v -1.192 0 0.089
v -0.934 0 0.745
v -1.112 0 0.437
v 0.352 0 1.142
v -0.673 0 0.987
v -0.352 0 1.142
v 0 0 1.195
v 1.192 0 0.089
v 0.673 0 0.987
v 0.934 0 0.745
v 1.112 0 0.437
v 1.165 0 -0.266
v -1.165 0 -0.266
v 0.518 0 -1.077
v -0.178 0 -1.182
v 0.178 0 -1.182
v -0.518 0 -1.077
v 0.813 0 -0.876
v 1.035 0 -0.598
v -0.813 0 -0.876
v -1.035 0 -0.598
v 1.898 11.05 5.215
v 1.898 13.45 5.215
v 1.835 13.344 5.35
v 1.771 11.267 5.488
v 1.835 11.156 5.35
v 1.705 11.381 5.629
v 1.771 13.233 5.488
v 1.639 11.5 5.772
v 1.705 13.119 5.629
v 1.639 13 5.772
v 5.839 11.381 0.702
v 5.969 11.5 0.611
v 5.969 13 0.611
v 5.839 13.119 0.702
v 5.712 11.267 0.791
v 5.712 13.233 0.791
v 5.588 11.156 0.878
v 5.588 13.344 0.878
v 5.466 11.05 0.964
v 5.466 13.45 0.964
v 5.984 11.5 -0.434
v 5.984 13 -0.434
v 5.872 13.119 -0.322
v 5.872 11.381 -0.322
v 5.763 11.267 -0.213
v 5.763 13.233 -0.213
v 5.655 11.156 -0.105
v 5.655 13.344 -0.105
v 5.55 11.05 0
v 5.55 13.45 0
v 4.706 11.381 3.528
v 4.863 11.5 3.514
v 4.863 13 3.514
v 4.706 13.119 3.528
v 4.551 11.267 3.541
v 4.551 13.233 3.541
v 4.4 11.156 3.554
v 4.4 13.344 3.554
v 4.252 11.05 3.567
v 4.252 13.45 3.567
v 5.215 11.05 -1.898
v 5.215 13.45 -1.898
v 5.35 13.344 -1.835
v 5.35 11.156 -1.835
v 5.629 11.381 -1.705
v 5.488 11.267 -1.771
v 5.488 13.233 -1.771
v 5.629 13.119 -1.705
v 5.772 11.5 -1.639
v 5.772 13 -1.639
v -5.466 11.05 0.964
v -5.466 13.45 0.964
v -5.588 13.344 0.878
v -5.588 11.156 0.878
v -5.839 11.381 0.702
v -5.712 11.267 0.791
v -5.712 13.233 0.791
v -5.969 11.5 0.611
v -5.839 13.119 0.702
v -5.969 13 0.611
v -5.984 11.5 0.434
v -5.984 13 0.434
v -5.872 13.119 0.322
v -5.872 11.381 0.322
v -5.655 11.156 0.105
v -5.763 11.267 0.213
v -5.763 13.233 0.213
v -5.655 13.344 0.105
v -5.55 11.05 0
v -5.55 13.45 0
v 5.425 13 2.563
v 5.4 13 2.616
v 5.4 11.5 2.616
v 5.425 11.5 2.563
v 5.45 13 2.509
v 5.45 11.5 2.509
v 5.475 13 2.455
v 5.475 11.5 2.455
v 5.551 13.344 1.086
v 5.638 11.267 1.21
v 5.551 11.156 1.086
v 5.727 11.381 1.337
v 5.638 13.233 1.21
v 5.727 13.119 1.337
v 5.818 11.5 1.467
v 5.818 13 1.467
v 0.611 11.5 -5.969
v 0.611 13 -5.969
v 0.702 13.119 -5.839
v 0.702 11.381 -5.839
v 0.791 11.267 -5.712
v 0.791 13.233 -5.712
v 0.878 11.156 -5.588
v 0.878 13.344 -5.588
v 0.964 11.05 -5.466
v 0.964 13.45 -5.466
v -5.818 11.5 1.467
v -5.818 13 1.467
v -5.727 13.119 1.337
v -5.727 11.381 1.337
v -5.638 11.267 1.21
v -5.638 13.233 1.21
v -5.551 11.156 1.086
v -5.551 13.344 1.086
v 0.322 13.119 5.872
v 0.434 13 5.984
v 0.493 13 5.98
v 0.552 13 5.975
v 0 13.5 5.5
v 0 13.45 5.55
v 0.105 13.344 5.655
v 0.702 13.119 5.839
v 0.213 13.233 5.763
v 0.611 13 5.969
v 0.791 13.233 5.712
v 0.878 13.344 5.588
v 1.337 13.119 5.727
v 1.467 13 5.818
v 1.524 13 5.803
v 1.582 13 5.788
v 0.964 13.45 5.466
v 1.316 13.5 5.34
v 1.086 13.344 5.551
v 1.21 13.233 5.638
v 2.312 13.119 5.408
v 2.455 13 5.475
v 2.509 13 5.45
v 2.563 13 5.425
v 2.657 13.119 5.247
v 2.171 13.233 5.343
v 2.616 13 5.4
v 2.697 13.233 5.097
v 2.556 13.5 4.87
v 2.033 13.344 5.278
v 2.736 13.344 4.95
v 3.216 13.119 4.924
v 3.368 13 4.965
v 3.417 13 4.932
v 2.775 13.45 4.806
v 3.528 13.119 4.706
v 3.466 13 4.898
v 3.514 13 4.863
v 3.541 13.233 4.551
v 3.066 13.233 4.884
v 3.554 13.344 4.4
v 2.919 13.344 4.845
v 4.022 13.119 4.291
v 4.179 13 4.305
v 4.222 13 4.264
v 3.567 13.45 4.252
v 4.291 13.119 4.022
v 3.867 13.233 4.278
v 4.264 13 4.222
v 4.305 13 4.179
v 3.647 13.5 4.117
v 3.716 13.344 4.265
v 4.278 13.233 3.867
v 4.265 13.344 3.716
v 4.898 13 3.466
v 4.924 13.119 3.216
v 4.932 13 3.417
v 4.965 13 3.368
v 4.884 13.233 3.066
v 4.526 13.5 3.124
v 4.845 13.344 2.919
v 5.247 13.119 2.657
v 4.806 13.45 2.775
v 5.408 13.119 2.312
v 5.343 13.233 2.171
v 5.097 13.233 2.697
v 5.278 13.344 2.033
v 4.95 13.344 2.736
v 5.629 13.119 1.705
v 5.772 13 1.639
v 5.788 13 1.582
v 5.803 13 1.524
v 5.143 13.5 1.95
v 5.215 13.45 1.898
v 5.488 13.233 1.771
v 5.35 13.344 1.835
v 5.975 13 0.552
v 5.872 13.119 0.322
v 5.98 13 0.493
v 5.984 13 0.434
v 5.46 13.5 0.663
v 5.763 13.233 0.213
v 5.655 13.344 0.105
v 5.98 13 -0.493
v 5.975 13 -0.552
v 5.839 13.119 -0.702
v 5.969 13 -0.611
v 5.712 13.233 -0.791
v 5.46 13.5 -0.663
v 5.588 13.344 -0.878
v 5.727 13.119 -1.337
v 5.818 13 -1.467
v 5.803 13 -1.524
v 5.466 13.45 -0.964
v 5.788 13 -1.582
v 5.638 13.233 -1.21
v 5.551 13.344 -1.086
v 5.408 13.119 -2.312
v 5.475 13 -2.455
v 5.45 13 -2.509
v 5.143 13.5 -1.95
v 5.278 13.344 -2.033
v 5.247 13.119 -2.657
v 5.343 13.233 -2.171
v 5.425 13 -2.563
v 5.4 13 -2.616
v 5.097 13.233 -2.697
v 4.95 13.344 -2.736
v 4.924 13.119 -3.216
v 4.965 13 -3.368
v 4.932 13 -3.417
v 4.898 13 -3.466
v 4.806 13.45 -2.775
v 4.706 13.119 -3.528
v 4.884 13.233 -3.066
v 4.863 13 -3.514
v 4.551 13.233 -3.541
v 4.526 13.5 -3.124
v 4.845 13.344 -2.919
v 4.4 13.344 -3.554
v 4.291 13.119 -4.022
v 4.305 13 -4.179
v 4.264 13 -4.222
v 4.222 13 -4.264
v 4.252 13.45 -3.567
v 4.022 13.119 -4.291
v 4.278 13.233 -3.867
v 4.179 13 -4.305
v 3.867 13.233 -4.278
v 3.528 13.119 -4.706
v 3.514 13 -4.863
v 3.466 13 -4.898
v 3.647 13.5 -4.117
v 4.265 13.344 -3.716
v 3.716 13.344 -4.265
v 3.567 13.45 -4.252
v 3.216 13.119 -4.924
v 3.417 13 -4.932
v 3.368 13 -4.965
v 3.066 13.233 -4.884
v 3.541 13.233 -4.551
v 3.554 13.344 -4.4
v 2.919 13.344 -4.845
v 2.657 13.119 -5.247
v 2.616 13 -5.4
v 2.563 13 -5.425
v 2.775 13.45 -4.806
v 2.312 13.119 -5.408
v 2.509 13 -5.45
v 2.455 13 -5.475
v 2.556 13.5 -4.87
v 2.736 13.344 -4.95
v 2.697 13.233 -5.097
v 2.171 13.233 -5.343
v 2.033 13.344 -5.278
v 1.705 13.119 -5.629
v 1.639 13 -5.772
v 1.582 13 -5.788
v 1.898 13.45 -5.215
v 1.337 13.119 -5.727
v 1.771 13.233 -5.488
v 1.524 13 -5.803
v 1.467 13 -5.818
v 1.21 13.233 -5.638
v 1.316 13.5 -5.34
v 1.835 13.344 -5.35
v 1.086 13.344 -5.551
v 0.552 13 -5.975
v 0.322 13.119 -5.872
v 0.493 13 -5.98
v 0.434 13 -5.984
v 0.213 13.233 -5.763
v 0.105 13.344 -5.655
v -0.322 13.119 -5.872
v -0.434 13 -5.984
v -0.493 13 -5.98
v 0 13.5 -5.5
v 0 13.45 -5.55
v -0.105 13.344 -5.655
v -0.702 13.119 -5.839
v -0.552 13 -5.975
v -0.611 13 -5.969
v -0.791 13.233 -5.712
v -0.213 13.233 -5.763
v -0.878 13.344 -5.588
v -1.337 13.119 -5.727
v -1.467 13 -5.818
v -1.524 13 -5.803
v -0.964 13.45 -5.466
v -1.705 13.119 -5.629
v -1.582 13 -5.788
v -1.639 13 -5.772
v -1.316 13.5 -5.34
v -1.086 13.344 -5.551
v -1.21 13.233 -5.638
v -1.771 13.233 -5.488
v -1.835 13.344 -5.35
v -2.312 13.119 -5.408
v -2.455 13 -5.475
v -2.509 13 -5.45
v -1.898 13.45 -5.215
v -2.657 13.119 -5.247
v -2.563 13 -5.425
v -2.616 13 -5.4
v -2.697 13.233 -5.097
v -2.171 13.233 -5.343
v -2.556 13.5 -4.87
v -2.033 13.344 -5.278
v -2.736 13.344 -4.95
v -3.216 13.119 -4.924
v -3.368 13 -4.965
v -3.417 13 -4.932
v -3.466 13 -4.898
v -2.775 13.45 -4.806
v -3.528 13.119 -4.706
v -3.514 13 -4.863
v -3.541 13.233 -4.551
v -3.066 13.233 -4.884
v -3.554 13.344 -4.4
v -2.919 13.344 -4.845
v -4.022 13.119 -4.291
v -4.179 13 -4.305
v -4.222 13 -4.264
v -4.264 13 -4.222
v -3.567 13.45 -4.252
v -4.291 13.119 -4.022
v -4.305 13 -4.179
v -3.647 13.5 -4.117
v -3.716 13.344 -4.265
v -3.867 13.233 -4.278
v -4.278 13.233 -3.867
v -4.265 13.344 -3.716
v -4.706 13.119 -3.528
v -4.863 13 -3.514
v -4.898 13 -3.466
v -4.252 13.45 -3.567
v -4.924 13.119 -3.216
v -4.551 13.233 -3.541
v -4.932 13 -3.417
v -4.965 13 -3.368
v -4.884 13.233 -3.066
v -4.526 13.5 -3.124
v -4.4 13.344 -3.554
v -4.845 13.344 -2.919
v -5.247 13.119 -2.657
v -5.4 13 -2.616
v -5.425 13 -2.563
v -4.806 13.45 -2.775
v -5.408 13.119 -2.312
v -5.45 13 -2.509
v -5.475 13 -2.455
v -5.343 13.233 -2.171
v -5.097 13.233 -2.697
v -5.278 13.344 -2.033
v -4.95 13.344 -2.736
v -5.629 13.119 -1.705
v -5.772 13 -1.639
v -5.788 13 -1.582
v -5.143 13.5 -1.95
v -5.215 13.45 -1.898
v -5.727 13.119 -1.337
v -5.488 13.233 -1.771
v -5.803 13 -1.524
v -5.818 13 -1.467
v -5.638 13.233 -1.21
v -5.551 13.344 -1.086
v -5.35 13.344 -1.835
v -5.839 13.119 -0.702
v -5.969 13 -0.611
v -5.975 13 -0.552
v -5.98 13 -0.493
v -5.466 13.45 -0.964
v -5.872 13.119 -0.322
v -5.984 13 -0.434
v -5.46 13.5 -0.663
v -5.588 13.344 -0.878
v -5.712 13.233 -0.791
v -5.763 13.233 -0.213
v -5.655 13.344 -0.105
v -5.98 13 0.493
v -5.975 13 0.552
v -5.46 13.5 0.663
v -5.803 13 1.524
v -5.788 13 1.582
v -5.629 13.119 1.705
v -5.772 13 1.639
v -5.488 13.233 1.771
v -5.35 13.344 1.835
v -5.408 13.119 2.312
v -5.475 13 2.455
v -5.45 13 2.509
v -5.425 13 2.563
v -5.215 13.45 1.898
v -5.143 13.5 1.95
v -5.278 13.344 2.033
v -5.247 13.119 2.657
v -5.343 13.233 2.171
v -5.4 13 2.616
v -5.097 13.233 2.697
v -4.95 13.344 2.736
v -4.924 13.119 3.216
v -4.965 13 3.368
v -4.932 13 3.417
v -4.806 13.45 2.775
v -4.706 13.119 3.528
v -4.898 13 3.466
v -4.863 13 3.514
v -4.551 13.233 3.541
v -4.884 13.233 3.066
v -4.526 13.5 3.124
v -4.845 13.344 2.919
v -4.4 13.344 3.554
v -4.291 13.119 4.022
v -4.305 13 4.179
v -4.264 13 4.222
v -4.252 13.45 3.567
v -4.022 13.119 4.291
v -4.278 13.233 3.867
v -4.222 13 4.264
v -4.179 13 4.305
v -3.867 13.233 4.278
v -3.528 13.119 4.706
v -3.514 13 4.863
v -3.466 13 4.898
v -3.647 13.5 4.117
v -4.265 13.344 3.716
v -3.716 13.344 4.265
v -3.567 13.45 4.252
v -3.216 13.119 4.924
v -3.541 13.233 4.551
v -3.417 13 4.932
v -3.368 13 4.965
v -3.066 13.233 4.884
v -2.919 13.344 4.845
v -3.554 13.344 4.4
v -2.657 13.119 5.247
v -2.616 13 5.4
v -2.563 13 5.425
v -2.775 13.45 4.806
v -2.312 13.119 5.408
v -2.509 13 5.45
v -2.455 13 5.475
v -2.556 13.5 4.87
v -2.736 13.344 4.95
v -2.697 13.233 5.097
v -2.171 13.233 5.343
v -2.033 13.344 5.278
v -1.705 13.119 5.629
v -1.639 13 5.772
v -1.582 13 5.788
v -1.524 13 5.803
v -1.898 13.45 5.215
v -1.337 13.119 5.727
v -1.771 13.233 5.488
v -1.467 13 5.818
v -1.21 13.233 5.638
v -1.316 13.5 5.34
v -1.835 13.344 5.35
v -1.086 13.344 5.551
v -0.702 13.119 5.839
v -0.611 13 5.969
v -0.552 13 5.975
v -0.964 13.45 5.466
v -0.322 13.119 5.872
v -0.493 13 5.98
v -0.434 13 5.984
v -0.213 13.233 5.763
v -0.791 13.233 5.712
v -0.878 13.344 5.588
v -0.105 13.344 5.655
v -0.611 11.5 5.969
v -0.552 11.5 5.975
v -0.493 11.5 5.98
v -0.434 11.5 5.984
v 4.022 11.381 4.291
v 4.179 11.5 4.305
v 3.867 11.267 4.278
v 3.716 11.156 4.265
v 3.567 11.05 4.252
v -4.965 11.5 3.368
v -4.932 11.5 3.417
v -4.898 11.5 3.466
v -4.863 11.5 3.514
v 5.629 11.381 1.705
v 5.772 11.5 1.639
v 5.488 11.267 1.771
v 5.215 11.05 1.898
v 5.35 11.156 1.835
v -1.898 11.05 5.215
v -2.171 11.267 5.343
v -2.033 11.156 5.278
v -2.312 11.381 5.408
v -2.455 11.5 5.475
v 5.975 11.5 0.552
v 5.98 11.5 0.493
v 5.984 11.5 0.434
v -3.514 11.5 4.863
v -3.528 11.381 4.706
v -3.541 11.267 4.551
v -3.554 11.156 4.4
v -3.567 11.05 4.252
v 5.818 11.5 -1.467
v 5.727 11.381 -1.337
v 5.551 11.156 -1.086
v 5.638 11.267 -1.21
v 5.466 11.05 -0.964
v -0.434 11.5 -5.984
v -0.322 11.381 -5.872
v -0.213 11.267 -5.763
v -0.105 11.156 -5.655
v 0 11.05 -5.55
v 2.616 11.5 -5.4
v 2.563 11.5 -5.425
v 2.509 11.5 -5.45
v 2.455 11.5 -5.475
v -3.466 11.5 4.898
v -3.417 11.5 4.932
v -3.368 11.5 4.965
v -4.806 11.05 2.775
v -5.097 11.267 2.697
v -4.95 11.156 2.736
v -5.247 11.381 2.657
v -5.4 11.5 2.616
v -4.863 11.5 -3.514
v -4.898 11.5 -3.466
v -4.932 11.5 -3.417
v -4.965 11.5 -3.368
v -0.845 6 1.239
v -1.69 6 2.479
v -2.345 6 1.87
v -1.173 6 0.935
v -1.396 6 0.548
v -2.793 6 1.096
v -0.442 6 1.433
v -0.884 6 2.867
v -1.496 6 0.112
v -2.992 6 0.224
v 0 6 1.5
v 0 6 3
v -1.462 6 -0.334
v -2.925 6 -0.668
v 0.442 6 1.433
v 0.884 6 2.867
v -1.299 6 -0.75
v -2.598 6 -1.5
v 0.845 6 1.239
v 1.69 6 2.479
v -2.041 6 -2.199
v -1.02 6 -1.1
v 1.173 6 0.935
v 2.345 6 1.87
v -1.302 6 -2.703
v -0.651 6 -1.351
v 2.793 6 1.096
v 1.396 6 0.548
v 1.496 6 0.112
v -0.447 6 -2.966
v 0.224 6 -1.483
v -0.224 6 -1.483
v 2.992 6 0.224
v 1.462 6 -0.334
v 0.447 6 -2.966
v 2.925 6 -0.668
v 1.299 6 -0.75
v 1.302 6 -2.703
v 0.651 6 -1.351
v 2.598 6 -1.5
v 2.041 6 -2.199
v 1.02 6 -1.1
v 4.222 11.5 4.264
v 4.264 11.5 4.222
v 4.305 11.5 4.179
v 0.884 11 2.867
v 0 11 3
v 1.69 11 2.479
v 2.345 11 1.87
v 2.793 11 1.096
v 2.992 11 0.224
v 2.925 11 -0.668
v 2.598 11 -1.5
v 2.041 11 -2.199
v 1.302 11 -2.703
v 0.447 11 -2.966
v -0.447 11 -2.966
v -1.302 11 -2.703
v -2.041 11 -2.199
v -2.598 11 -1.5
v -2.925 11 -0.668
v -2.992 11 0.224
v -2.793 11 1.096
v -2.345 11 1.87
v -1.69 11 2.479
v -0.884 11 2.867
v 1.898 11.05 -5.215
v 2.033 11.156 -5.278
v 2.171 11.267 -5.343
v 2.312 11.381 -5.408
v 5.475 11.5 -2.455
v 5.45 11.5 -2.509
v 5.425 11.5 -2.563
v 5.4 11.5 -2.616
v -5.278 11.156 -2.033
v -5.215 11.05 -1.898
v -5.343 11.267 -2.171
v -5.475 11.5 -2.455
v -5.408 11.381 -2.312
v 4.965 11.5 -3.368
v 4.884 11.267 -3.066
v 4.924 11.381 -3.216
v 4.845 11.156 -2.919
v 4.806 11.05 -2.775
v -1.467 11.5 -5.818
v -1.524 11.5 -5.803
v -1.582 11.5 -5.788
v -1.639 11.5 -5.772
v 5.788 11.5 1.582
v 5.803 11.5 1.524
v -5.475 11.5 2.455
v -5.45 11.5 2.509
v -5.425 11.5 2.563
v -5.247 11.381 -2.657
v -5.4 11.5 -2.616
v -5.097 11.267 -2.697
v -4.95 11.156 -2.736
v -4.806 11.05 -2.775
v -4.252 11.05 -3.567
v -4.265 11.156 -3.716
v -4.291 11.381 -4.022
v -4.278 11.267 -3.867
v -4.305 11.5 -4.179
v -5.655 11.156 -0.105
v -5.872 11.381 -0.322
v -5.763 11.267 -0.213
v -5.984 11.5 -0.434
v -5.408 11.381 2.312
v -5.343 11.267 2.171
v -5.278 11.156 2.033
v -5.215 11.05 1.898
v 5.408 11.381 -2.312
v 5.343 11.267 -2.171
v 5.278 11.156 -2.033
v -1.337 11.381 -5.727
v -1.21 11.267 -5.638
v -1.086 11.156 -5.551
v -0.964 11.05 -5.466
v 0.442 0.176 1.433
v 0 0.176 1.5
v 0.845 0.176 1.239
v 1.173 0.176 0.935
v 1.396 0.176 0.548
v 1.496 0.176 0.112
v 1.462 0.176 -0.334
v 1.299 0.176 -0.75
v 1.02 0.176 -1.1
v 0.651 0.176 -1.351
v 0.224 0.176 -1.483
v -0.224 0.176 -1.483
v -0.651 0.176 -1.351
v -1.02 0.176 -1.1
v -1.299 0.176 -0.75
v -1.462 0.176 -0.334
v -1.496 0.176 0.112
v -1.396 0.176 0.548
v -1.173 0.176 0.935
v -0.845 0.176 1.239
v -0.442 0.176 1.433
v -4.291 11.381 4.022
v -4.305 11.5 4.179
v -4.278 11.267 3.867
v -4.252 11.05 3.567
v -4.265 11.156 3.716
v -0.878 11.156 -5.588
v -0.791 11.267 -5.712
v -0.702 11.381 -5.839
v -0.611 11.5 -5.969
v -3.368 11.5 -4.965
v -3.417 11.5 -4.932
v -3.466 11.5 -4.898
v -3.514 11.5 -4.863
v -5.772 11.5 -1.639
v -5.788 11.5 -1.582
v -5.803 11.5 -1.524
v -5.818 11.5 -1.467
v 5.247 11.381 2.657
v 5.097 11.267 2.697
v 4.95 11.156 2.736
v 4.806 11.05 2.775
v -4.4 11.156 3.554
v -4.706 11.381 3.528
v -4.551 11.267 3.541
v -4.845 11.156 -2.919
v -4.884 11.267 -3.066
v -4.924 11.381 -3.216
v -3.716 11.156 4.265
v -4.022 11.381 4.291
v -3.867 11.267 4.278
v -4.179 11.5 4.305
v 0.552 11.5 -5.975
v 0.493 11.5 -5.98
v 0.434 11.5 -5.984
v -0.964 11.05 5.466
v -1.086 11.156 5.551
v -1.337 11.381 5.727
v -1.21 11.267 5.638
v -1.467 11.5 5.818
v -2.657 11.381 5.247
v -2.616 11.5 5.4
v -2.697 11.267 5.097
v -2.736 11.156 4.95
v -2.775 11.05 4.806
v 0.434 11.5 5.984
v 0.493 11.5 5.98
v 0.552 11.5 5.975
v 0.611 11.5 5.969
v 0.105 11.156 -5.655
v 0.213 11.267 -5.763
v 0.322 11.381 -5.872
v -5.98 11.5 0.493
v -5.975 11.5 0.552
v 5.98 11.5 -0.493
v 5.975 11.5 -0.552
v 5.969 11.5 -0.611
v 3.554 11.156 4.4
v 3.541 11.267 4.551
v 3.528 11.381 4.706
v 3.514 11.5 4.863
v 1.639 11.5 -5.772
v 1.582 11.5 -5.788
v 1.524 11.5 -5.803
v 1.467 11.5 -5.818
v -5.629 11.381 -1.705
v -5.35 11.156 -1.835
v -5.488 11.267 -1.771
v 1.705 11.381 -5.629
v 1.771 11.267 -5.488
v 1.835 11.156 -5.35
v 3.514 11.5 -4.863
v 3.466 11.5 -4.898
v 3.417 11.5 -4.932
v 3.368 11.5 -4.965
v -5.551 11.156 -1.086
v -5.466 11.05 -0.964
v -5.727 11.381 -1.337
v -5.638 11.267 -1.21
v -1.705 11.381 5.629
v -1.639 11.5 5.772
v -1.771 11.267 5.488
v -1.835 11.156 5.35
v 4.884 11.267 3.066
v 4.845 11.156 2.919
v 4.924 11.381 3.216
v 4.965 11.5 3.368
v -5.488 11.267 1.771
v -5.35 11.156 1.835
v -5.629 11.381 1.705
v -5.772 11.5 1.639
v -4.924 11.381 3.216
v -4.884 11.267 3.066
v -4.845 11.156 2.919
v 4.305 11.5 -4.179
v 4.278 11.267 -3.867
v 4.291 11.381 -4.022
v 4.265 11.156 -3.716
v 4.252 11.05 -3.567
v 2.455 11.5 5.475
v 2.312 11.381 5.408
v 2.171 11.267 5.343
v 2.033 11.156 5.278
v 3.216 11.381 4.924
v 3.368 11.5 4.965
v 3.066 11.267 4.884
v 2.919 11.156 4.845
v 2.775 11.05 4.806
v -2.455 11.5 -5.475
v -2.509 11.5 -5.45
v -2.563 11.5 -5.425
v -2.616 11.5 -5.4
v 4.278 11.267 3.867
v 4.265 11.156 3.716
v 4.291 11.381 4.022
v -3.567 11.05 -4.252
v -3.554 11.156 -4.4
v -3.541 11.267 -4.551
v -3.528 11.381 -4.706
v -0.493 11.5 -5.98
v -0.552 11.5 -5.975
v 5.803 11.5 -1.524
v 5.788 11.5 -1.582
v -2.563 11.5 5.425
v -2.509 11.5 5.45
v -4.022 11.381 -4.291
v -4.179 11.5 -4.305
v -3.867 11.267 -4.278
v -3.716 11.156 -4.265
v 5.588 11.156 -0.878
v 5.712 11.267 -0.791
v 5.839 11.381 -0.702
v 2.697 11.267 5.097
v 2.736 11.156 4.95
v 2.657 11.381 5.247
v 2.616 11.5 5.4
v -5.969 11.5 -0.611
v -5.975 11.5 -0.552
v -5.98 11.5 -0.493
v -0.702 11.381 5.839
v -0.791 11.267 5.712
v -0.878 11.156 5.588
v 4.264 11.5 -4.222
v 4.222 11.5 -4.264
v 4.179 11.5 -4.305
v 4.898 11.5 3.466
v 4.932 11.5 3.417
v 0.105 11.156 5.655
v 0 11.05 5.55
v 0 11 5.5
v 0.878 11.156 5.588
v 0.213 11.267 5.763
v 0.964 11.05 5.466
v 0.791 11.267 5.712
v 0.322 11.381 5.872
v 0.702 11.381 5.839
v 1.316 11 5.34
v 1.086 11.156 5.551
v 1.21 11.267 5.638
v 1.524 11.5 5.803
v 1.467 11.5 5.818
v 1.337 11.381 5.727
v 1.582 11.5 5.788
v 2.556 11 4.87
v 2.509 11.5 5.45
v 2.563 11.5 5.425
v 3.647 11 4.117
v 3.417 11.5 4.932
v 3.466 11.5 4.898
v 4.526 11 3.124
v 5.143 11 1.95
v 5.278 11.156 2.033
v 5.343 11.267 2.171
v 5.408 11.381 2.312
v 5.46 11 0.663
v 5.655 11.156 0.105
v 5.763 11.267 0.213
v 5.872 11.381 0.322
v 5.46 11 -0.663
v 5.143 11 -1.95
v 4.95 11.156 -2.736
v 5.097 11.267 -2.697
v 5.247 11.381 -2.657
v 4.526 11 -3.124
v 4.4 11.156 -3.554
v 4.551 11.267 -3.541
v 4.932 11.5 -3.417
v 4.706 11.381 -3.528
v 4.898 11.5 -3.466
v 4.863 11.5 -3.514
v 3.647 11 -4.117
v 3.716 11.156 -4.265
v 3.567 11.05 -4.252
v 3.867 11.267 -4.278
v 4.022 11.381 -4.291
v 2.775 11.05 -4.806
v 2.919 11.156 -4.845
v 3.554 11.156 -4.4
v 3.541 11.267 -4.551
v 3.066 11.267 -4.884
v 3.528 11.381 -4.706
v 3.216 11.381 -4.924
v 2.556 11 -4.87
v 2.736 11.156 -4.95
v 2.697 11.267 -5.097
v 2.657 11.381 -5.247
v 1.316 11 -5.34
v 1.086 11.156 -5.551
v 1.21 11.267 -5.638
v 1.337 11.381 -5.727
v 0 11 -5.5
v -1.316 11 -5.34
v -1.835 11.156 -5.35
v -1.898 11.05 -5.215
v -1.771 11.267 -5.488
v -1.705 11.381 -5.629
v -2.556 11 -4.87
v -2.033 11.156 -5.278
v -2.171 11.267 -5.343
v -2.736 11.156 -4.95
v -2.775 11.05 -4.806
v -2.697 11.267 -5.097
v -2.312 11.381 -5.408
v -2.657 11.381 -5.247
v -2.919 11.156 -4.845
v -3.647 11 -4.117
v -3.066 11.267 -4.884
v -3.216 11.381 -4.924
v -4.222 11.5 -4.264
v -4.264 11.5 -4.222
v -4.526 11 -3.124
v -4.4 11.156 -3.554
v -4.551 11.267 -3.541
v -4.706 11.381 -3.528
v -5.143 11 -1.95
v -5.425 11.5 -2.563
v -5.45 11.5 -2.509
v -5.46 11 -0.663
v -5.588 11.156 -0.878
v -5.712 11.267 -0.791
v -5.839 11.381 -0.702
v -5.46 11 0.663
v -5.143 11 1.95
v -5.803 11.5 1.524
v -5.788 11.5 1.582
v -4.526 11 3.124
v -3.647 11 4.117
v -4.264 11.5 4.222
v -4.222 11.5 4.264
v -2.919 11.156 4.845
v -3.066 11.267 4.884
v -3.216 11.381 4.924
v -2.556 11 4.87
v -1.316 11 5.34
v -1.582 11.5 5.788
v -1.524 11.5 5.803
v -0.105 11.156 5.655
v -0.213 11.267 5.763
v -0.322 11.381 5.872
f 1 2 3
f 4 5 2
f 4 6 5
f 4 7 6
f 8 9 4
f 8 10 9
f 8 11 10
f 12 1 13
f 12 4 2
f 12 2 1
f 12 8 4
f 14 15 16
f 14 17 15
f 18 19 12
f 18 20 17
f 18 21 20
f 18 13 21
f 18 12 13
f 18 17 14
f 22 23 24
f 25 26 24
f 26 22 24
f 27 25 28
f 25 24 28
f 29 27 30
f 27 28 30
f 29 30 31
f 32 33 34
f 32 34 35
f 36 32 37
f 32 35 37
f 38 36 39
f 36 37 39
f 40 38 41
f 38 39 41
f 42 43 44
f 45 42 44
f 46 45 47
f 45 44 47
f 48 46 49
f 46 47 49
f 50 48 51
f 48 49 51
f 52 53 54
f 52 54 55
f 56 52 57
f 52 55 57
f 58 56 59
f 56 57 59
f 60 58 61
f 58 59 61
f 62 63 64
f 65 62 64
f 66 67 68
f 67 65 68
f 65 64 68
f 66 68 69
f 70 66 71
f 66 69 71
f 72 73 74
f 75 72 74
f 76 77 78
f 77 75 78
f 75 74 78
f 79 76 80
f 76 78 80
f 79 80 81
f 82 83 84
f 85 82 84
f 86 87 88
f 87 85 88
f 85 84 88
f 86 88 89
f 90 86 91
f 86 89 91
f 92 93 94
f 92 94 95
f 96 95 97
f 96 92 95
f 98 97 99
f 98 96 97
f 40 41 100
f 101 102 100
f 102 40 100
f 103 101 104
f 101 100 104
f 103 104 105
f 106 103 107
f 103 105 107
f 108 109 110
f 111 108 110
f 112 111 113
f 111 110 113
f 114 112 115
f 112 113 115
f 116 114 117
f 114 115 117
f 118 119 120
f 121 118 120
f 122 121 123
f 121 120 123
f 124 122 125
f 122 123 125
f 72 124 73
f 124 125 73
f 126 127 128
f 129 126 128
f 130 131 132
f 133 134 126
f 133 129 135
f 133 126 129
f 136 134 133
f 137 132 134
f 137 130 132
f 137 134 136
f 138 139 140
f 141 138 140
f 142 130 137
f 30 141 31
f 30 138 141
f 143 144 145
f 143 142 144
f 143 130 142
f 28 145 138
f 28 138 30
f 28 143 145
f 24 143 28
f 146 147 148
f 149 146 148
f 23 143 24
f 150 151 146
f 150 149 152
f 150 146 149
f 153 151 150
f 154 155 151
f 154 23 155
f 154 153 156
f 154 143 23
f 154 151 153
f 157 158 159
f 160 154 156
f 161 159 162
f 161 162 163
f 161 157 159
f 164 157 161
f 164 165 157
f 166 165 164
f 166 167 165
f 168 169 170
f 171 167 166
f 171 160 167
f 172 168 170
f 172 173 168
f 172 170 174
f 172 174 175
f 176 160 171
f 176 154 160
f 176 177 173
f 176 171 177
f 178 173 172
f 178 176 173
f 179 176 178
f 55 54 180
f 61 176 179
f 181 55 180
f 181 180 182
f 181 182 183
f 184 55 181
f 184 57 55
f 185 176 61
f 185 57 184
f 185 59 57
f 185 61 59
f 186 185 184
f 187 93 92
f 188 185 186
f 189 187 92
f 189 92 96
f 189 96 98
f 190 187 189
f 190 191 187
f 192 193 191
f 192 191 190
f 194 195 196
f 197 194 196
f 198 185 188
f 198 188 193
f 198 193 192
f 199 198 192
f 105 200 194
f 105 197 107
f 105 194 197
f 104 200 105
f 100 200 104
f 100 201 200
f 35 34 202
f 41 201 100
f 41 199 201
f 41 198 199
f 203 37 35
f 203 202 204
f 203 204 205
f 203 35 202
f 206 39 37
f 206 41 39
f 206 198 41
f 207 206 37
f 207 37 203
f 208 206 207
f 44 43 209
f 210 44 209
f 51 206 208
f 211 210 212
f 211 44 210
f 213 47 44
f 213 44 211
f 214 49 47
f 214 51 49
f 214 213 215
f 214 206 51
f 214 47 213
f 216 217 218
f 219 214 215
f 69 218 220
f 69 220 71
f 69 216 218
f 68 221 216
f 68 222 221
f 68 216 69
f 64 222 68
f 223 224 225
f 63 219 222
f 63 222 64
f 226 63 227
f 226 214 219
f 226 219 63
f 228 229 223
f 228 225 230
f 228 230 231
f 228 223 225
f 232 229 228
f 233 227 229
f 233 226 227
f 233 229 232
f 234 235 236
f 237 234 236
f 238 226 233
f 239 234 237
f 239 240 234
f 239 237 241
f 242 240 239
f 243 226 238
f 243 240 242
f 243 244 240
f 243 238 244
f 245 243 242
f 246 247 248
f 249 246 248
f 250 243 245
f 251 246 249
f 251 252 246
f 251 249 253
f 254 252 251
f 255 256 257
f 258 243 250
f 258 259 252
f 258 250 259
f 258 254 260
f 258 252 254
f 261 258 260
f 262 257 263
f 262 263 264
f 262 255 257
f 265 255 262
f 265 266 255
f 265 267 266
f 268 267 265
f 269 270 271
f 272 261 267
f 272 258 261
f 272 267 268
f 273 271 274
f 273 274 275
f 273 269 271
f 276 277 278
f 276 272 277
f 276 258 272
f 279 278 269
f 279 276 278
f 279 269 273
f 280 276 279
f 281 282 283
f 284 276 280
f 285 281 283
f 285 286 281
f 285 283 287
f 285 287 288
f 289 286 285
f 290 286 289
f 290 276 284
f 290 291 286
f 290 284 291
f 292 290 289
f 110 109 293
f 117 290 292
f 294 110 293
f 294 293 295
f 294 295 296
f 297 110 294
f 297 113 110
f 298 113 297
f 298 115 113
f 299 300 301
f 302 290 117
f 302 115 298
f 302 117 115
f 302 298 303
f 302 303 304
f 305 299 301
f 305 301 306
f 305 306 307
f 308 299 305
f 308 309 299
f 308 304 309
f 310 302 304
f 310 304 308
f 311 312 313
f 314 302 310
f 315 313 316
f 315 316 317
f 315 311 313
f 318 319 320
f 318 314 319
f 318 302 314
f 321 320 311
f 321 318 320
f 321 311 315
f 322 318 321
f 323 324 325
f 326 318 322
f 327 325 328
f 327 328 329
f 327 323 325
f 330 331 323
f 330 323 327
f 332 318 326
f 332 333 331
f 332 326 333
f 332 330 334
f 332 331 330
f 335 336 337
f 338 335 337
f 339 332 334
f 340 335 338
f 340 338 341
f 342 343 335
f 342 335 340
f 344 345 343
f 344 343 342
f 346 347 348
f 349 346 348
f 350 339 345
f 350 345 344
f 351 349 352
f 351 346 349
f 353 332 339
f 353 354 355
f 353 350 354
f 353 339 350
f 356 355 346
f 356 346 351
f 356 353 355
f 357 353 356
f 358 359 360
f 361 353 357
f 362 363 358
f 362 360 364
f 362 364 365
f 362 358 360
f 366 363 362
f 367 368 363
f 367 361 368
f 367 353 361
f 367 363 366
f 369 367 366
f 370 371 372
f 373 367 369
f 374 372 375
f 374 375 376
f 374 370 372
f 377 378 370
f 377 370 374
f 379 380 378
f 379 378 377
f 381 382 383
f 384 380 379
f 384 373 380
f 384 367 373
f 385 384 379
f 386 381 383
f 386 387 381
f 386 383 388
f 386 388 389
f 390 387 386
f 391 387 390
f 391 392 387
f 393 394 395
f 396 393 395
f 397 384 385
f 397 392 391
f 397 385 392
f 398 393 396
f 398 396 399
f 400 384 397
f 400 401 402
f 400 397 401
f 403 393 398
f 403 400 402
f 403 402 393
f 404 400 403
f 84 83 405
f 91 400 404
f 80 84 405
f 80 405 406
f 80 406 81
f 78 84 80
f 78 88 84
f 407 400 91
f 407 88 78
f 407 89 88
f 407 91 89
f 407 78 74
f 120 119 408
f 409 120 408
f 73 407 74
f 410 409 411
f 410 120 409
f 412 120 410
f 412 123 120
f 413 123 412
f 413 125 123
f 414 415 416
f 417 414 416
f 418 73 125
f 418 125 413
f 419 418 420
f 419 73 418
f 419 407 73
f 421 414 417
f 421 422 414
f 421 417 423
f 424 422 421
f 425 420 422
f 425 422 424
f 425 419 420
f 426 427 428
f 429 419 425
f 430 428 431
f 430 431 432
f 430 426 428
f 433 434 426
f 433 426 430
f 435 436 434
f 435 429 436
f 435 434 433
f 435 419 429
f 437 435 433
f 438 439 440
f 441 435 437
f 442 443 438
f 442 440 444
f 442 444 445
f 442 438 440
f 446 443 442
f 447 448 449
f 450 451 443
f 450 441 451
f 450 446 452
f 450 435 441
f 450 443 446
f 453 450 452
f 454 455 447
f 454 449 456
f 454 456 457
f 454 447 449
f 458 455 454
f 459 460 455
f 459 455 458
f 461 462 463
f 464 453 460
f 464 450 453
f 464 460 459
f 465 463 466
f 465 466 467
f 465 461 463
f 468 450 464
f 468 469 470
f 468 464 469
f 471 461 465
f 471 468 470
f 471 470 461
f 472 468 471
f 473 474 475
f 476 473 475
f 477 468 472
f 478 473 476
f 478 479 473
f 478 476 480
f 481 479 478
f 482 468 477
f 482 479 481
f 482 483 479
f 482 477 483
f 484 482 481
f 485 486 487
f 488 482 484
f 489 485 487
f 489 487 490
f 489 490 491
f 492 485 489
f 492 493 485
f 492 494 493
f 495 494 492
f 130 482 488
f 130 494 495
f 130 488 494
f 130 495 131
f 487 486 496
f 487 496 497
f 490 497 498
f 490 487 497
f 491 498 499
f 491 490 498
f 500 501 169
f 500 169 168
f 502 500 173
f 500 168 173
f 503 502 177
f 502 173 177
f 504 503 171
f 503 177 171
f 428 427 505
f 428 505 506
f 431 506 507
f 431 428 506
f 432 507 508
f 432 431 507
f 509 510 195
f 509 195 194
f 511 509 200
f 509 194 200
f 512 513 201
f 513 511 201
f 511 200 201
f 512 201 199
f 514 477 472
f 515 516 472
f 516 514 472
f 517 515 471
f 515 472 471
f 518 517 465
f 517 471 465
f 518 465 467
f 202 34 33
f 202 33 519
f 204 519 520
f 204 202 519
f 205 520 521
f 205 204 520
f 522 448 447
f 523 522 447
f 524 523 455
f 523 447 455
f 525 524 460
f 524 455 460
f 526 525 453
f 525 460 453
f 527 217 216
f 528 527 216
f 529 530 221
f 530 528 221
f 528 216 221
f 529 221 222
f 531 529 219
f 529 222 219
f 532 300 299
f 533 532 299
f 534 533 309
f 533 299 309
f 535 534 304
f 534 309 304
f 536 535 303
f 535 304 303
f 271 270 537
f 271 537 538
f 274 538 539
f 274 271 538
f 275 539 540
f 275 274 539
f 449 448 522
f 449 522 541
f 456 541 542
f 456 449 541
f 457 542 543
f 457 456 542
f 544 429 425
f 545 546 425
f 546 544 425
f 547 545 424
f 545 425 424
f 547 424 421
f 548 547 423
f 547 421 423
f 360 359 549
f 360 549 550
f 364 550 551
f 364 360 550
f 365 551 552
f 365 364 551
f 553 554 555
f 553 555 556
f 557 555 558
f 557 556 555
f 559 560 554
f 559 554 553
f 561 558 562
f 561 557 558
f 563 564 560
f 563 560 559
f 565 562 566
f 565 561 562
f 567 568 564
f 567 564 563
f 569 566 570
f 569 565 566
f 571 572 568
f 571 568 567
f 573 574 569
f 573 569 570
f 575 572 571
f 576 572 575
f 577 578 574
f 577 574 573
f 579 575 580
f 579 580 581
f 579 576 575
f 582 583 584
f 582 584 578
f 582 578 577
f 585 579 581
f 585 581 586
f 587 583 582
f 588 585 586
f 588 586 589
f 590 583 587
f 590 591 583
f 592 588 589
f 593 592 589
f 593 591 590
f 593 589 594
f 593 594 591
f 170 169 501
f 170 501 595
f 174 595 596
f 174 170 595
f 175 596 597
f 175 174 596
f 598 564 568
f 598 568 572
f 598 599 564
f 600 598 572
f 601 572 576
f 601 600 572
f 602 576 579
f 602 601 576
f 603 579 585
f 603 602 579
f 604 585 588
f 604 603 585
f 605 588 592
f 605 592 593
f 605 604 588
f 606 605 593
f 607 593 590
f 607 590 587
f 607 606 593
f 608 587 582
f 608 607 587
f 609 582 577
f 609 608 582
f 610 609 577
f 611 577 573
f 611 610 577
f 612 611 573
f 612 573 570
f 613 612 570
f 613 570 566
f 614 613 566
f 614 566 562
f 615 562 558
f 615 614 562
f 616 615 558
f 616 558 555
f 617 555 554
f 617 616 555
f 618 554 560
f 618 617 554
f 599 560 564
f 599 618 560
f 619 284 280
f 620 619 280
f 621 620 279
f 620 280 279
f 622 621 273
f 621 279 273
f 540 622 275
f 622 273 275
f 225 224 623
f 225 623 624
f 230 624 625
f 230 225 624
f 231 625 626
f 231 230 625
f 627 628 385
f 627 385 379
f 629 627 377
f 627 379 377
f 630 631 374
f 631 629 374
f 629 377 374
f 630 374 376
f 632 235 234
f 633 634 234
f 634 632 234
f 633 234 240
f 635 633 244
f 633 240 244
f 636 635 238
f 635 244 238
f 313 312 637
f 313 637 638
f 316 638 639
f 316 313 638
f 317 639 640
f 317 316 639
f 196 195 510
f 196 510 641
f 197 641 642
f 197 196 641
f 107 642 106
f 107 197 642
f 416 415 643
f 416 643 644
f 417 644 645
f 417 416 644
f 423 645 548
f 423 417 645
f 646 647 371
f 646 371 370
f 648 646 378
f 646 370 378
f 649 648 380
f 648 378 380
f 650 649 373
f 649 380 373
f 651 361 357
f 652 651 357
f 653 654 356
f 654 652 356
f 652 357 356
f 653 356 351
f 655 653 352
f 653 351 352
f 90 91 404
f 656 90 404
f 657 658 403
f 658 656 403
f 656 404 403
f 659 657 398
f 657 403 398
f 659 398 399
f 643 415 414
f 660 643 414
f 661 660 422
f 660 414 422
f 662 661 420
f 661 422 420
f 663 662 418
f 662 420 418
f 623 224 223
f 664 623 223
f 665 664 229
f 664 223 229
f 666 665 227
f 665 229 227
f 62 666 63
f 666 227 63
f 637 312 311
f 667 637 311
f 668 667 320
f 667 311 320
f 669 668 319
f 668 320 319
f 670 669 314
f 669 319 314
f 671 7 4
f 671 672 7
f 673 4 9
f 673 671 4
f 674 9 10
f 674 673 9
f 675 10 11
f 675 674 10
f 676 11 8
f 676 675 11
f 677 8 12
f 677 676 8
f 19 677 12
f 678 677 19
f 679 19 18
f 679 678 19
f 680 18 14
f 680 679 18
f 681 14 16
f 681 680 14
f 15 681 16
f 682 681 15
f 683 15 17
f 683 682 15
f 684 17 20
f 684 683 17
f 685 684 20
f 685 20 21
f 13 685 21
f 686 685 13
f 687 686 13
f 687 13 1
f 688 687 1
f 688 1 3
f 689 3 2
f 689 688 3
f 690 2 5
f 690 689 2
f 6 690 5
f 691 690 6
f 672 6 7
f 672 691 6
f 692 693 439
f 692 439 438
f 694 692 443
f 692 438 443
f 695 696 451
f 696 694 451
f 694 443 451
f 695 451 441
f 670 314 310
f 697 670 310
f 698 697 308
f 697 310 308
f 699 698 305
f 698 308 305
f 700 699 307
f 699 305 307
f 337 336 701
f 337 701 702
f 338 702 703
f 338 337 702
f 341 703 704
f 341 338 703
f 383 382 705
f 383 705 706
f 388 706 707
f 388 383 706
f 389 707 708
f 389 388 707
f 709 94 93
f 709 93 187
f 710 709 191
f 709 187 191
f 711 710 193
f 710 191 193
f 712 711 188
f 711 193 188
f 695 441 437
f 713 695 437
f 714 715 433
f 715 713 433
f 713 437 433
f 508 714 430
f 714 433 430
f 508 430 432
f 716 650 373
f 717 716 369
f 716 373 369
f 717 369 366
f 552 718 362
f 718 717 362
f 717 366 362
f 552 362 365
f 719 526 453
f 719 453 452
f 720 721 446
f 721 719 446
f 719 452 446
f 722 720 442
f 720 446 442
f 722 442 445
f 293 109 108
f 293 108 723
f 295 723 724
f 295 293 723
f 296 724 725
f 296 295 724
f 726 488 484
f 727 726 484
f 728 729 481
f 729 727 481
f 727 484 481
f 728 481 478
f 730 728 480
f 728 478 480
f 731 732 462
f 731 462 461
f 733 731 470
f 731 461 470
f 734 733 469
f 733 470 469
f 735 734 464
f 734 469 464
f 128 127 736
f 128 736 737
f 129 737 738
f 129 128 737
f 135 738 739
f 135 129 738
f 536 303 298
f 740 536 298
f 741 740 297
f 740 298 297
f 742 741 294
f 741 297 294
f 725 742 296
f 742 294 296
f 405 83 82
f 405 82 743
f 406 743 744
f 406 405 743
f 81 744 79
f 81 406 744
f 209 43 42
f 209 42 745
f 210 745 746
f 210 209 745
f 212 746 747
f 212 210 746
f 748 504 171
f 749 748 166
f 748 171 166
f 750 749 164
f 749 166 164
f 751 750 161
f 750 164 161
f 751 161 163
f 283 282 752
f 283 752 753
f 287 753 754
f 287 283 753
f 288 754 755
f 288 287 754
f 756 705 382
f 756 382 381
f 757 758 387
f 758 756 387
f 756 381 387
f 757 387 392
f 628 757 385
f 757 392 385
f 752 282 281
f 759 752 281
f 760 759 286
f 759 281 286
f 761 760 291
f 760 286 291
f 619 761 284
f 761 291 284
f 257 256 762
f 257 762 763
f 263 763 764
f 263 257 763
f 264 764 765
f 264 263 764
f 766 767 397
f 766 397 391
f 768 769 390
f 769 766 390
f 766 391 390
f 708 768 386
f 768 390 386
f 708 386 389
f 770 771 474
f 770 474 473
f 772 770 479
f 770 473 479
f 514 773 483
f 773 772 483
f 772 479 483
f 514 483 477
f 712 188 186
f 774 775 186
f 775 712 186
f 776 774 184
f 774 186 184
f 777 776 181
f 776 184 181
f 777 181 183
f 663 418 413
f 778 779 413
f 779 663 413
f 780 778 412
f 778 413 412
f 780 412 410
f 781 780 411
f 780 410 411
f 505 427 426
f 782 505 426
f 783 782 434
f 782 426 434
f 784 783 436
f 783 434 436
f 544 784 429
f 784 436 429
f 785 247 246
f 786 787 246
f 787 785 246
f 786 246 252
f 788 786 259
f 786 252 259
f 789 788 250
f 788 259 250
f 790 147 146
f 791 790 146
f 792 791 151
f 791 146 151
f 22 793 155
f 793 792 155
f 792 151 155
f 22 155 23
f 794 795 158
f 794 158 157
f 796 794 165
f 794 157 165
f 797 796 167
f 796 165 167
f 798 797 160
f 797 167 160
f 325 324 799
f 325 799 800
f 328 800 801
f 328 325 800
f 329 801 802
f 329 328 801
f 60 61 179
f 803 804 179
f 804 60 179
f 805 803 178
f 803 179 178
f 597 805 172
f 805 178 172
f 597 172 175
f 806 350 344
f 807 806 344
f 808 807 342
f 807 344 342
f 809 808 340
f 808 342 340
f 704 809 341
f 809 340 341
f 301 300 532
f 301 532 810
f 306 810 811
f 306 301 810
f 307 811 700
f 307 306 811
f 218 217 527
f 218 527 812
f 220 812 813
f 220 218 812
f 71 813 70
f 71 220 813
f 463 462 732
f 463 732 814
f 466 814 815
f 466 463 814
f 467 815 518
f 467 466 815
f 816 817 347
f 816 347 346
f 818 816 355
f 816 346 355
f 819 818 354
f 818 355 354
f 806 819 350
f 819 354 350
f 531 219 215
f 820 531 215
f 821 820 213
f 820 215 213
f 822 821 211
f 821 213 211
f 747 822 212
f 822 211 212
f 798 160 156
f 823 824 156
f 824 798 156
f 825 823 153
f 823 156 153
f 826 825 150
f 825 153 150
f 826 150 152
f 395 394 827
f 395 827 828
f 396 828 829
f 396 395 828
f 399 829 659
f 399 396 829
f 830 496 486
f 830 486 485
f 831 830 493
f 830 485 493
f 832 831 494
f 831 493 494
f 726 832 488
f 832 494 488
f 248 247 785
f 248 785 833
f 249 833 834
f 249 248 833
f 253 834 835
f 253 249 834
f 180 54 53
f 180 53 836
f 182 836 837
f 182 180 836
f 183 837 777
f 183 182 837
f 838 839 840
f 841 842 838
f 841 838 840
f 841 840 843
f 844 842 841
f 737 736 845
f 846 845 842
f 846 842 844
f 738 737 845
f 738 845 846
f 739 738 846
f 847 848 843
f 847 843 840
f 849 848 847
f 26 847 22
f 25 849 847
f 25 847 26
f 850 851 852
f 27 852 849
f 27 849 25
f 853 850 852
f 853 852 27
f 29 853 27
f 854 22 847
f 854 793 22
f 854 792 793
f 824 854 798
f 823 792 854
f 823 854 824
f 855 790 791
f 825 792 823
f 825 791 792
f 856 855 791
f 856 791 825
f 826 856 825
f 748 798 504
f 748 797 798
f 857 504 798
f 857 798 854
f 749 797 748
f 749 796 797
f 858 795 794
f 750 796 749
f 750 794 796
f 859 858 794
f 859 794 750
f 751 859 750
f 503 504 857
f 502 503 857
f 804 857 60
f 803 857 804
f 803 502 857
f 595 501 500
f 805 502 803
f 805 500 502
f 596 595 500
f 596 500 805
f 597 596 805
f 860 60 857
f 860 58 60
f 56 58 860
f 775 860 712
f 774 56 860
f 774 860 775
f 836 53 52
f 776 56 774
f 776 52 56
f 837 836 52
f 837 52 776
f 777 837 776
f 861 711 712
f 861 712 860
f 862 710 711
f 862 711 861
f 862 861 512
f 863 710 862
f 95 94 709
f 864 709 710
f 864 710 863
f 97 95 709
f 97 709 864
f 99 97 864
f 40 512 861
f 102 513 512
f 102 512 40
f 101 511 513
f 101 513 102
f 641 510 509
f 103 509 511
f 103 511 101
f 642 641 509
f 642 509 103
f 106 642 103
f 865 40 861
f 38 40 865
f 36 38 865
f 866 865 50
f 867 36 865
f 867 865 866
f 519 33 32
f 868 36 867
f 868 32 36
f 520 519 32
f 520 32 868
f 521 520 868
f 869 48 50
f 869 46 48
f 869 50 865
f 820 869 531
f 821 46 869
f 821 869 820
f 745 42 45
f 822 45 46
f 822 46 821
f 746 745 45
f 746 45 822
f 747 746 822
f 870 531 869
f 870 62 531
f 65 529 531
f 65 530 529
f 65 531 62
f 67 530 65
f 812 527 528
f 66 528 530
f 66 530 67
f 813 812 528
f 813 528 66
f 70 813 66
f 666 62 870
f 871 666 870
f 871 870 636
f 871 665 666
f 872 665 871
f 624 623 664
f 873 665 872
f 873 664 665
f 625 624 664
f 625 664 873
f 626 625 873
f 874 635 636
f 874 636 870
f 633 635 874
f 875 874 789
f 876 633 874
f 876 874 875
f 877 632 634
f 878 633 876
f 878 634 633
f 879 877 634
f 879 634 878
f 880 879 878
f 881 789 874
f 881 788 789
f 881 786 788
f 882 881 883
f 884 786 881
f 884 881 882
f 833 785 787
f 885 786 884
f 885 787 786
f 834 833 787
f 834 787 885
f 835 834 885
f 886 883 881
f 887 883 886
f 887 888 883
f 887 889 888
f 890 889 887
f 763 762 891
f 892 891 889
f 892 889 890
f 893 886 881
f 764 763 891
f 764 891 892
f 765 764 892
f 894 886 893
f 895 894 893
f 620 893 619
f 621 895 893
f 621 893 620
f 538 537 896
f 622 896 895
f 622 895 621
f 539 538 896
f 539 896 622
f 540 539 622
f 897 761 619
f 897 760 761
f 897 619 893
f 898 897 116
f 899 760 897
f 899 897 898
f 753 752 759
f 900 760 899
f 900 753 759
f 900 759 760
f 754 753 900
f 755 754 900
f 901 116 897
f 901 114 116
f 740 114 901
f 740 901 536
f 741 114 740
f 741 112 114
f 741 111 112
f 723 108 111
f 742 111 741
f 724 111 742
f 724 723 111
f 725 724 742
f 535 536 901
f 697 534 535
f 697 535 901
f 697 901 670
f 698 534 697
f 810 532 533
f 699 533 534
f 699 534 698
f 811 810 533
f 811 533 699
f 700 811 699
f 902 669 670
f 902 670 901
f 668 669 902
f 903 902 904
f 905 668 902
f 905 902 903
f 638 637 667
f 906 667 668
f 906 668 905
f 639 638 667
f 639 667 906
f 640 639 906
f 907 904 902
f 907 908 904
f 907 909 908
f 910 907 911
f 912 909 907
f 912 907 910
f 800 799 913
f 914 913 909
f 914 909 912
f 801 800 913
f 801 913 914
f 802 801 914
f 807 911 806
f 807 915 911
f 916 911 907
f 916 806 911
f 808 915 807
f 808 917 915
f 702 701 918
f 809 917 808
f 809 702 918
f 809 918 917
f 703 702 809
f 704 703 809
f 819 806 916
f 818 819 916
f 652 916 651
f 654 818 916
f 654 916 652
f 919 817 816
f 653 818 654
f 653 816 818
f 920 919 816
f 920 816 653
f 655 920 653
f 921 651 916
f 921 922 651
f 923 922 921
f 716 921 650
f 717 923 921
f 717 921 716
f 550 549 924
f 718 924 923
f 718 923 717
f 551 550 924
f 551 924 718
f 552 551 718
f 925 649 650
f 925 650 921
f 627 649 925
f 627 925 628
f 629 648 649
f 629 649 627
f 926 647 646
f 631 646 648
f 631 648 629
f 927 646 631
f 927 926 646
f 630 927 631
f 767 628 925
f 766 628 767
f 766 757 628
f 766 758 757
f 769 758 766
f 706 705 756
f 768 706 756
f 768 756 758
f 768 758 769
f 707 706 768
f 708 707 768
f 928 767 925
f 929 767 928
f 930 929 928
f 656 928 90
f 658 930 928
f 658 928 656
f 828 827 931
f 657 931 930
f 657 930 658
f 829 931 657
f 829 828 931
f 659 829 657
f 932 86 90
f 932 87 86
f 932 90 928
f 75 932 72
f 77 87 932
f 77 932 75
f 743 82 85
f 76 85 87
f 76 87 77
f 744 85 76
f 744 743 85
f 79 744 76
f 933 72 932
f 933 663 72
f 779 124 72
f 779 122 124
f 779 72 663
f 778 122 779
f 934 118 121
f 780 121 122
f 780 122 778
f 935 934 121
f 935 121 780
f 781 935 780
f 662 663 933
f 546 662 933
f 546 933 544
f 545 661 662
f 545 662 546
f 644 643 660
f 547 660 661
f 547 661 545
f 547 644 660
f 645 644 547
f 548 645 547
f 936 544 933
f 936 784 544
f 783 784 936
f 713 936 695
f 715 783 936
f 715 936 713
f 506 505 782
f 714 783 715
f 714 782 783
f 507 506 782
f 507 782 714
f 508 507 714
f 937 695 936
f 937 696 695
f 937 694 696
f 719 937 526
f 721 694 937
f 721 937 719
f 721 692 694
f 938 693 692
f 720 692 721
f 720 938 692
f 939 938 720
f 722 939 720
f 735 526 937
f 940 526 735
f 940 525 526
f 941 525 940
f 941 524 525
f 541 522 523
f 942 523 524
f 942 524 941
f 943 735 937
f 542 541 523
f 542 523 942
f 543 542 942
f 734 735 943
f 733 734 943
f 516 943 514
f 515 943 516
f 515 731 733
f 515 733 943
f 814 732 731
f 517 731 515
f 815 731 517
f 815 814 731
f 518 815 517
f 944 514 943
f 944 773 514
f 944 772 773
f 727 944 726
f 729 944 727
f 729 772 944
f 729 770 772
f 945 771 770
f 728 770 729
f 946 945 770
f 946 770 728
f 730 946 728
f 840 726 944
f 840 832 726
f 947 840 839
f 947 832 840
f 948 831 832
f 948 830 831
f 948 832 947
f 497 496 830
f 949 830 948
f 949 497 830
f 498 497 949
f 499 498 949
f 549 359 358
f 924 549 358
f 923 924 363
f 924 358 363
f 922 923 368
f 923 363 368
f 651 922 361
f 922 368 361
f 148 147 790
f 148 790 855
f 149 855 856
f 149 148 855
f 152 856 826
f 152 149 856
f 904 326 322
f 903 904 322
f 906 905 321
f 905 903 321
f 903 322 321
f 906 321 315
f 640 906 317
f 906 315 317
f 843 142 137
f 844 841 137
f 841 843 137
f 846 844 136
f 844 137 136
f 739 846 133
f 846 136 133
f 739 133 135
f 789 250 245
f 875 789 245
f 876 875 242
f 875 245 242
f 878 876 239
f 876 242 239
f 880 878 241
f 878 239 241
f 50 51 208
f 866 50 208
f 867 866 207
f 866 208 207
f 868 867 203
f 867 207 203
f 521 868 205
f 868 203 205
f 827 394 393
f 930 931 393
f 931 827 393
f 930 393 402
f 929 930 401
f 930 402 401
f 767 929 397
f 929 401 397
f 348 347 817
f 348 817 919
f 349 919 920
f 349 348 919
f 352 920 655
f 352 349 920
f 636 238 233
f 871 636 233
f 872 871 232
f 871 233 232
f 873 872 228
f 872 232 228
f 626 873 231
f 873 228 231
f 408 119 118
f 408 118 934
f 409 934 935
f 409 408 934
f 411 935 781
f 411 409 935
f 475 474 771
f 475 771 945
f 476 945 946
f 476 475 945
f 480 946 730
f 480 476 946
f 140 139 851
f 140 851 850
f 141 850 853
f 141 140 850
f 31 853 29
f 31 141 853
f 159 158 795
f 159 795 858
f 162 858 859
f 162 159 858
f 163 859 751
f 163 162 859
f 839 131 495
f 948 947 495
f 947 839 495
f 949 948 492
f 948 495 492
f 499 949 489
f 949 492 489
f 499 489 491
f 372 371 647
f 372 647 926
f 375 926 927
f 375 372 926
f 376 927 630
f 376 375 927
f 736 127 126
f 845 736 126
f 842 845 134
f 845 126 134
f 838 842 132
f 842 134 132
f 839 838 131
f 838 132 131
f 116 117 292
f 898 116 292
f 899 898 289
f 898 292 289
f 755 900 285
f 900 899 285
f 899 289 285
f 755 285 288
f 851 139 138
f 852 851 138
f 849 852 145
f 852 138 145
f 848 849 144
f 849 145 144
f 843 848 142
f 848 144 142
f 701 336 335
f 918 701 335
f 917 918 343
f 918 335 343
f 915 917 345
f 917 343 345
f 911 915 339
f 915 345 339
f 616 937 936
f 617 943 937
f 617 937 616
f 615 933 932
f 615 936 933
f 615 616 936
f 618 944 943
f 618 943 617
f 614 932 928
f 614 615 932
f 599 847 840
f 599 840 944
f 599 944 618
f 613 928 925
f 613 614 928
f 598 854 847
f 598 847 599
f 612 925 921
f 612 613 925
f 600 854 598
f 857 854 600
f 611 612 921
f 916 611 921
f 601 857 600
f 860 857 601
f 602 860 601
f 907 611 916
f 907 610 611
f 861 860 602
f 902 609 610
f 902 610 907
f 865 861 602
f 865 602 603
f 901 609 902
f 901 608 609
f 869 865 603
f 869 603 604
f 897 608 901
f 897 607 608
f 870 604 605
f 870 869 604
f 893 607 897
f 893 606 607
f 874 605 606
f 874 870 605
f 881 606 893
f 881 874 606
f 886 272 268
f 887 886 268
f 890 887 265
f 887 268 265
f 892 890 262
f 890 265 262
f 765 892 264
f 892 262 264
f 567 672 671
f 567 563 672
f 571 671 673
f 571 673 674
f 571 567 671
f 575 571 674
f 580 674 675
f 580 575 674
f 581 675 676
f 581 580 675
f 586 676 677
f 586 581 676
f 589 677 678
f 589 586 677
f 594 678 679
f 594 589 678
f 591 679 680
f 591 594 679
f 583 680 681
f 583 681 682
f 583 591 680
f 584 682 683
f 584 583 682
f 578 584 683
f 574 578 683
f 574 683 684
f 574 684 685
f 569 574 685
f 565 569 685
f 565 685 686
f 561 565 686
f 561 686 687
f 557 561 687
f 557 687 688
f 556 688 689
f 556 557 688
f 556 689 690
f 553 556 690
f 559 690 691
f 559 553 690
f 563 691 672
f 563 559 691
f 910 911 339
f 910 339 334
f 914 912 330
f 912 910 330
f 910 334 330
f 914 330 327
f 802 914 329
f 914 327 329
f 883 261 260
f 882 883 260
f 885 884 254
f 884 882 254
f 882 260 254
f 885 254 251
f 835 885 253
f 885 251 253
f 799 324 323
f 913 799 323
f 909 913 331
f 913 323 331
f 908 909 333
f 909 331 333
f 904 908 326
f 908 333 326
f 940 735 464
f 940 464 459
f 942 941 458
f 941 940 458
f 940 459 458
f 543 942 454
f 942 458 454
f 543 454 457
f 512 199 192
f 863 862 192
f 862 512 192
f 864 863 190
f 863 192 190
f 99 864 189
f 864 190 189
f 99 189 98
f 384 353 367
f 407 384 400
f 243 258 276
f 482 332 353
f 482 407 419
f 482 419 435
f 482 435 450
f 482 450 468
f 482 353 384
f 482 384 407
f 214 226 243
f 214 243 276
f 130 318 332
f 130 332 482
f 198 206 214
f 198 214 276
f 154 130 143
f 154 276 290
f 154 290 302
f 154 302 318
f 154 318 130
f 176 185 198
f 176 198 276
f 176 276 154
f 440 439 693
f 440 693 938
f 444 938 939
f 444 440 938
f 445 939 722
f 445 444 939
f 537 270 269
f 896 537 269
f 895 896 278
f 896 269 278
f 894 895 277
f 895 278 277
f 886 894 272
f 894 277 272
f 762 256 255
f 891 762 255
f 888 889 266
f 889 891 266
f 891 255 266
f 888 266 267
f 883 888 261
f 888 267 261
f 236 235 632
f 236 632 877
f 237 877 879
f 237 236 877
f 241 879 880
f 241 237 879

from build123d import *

# Parameters (mm, degrees)
POCKET_DEPTH       = 56.871497
POLARPATTERN_COUNT = 36


with BuildPart() as part:
    # Sketch → Revolution (revolve)
    with BuildSketch(Plane.YZ):
        Polygon((0, 0), (0, 1.195), (0.176092, 1.5), (6, 1.5), (6, 3), (11, 3), (11, 5.5), (11.5, 6), (13, 6), (13.5, 5.5), (13.5, 0), align=None)
    revolve(axis=Axis((0, 0, 0), (0, 1, 0)))

    # Sketch001 → Pocket (cut, through all)
    with BuildSketch(Plane.ZX.offset(13.5)):
        Polygon((-0.5, 6.05), (0, 5.55), (0.5, 6.05), align=None)
    pocket = extrude(amount=-POCKET_DEPTH, mode=Mode.SUBTRACT)

    # PolarPattern: Pocket ×36 about axis
    polarpattern_axis = Axis((0, 13.5, 0), (0, 1, 0))
    for i in range(1, POLARPATTERN_COUNT):
        add(pocket.rotate(polarpattern_axis, i * 360 / POLARPATTERN_COUNT), mode=Mode.SUBTRACT)


solid = part.part
